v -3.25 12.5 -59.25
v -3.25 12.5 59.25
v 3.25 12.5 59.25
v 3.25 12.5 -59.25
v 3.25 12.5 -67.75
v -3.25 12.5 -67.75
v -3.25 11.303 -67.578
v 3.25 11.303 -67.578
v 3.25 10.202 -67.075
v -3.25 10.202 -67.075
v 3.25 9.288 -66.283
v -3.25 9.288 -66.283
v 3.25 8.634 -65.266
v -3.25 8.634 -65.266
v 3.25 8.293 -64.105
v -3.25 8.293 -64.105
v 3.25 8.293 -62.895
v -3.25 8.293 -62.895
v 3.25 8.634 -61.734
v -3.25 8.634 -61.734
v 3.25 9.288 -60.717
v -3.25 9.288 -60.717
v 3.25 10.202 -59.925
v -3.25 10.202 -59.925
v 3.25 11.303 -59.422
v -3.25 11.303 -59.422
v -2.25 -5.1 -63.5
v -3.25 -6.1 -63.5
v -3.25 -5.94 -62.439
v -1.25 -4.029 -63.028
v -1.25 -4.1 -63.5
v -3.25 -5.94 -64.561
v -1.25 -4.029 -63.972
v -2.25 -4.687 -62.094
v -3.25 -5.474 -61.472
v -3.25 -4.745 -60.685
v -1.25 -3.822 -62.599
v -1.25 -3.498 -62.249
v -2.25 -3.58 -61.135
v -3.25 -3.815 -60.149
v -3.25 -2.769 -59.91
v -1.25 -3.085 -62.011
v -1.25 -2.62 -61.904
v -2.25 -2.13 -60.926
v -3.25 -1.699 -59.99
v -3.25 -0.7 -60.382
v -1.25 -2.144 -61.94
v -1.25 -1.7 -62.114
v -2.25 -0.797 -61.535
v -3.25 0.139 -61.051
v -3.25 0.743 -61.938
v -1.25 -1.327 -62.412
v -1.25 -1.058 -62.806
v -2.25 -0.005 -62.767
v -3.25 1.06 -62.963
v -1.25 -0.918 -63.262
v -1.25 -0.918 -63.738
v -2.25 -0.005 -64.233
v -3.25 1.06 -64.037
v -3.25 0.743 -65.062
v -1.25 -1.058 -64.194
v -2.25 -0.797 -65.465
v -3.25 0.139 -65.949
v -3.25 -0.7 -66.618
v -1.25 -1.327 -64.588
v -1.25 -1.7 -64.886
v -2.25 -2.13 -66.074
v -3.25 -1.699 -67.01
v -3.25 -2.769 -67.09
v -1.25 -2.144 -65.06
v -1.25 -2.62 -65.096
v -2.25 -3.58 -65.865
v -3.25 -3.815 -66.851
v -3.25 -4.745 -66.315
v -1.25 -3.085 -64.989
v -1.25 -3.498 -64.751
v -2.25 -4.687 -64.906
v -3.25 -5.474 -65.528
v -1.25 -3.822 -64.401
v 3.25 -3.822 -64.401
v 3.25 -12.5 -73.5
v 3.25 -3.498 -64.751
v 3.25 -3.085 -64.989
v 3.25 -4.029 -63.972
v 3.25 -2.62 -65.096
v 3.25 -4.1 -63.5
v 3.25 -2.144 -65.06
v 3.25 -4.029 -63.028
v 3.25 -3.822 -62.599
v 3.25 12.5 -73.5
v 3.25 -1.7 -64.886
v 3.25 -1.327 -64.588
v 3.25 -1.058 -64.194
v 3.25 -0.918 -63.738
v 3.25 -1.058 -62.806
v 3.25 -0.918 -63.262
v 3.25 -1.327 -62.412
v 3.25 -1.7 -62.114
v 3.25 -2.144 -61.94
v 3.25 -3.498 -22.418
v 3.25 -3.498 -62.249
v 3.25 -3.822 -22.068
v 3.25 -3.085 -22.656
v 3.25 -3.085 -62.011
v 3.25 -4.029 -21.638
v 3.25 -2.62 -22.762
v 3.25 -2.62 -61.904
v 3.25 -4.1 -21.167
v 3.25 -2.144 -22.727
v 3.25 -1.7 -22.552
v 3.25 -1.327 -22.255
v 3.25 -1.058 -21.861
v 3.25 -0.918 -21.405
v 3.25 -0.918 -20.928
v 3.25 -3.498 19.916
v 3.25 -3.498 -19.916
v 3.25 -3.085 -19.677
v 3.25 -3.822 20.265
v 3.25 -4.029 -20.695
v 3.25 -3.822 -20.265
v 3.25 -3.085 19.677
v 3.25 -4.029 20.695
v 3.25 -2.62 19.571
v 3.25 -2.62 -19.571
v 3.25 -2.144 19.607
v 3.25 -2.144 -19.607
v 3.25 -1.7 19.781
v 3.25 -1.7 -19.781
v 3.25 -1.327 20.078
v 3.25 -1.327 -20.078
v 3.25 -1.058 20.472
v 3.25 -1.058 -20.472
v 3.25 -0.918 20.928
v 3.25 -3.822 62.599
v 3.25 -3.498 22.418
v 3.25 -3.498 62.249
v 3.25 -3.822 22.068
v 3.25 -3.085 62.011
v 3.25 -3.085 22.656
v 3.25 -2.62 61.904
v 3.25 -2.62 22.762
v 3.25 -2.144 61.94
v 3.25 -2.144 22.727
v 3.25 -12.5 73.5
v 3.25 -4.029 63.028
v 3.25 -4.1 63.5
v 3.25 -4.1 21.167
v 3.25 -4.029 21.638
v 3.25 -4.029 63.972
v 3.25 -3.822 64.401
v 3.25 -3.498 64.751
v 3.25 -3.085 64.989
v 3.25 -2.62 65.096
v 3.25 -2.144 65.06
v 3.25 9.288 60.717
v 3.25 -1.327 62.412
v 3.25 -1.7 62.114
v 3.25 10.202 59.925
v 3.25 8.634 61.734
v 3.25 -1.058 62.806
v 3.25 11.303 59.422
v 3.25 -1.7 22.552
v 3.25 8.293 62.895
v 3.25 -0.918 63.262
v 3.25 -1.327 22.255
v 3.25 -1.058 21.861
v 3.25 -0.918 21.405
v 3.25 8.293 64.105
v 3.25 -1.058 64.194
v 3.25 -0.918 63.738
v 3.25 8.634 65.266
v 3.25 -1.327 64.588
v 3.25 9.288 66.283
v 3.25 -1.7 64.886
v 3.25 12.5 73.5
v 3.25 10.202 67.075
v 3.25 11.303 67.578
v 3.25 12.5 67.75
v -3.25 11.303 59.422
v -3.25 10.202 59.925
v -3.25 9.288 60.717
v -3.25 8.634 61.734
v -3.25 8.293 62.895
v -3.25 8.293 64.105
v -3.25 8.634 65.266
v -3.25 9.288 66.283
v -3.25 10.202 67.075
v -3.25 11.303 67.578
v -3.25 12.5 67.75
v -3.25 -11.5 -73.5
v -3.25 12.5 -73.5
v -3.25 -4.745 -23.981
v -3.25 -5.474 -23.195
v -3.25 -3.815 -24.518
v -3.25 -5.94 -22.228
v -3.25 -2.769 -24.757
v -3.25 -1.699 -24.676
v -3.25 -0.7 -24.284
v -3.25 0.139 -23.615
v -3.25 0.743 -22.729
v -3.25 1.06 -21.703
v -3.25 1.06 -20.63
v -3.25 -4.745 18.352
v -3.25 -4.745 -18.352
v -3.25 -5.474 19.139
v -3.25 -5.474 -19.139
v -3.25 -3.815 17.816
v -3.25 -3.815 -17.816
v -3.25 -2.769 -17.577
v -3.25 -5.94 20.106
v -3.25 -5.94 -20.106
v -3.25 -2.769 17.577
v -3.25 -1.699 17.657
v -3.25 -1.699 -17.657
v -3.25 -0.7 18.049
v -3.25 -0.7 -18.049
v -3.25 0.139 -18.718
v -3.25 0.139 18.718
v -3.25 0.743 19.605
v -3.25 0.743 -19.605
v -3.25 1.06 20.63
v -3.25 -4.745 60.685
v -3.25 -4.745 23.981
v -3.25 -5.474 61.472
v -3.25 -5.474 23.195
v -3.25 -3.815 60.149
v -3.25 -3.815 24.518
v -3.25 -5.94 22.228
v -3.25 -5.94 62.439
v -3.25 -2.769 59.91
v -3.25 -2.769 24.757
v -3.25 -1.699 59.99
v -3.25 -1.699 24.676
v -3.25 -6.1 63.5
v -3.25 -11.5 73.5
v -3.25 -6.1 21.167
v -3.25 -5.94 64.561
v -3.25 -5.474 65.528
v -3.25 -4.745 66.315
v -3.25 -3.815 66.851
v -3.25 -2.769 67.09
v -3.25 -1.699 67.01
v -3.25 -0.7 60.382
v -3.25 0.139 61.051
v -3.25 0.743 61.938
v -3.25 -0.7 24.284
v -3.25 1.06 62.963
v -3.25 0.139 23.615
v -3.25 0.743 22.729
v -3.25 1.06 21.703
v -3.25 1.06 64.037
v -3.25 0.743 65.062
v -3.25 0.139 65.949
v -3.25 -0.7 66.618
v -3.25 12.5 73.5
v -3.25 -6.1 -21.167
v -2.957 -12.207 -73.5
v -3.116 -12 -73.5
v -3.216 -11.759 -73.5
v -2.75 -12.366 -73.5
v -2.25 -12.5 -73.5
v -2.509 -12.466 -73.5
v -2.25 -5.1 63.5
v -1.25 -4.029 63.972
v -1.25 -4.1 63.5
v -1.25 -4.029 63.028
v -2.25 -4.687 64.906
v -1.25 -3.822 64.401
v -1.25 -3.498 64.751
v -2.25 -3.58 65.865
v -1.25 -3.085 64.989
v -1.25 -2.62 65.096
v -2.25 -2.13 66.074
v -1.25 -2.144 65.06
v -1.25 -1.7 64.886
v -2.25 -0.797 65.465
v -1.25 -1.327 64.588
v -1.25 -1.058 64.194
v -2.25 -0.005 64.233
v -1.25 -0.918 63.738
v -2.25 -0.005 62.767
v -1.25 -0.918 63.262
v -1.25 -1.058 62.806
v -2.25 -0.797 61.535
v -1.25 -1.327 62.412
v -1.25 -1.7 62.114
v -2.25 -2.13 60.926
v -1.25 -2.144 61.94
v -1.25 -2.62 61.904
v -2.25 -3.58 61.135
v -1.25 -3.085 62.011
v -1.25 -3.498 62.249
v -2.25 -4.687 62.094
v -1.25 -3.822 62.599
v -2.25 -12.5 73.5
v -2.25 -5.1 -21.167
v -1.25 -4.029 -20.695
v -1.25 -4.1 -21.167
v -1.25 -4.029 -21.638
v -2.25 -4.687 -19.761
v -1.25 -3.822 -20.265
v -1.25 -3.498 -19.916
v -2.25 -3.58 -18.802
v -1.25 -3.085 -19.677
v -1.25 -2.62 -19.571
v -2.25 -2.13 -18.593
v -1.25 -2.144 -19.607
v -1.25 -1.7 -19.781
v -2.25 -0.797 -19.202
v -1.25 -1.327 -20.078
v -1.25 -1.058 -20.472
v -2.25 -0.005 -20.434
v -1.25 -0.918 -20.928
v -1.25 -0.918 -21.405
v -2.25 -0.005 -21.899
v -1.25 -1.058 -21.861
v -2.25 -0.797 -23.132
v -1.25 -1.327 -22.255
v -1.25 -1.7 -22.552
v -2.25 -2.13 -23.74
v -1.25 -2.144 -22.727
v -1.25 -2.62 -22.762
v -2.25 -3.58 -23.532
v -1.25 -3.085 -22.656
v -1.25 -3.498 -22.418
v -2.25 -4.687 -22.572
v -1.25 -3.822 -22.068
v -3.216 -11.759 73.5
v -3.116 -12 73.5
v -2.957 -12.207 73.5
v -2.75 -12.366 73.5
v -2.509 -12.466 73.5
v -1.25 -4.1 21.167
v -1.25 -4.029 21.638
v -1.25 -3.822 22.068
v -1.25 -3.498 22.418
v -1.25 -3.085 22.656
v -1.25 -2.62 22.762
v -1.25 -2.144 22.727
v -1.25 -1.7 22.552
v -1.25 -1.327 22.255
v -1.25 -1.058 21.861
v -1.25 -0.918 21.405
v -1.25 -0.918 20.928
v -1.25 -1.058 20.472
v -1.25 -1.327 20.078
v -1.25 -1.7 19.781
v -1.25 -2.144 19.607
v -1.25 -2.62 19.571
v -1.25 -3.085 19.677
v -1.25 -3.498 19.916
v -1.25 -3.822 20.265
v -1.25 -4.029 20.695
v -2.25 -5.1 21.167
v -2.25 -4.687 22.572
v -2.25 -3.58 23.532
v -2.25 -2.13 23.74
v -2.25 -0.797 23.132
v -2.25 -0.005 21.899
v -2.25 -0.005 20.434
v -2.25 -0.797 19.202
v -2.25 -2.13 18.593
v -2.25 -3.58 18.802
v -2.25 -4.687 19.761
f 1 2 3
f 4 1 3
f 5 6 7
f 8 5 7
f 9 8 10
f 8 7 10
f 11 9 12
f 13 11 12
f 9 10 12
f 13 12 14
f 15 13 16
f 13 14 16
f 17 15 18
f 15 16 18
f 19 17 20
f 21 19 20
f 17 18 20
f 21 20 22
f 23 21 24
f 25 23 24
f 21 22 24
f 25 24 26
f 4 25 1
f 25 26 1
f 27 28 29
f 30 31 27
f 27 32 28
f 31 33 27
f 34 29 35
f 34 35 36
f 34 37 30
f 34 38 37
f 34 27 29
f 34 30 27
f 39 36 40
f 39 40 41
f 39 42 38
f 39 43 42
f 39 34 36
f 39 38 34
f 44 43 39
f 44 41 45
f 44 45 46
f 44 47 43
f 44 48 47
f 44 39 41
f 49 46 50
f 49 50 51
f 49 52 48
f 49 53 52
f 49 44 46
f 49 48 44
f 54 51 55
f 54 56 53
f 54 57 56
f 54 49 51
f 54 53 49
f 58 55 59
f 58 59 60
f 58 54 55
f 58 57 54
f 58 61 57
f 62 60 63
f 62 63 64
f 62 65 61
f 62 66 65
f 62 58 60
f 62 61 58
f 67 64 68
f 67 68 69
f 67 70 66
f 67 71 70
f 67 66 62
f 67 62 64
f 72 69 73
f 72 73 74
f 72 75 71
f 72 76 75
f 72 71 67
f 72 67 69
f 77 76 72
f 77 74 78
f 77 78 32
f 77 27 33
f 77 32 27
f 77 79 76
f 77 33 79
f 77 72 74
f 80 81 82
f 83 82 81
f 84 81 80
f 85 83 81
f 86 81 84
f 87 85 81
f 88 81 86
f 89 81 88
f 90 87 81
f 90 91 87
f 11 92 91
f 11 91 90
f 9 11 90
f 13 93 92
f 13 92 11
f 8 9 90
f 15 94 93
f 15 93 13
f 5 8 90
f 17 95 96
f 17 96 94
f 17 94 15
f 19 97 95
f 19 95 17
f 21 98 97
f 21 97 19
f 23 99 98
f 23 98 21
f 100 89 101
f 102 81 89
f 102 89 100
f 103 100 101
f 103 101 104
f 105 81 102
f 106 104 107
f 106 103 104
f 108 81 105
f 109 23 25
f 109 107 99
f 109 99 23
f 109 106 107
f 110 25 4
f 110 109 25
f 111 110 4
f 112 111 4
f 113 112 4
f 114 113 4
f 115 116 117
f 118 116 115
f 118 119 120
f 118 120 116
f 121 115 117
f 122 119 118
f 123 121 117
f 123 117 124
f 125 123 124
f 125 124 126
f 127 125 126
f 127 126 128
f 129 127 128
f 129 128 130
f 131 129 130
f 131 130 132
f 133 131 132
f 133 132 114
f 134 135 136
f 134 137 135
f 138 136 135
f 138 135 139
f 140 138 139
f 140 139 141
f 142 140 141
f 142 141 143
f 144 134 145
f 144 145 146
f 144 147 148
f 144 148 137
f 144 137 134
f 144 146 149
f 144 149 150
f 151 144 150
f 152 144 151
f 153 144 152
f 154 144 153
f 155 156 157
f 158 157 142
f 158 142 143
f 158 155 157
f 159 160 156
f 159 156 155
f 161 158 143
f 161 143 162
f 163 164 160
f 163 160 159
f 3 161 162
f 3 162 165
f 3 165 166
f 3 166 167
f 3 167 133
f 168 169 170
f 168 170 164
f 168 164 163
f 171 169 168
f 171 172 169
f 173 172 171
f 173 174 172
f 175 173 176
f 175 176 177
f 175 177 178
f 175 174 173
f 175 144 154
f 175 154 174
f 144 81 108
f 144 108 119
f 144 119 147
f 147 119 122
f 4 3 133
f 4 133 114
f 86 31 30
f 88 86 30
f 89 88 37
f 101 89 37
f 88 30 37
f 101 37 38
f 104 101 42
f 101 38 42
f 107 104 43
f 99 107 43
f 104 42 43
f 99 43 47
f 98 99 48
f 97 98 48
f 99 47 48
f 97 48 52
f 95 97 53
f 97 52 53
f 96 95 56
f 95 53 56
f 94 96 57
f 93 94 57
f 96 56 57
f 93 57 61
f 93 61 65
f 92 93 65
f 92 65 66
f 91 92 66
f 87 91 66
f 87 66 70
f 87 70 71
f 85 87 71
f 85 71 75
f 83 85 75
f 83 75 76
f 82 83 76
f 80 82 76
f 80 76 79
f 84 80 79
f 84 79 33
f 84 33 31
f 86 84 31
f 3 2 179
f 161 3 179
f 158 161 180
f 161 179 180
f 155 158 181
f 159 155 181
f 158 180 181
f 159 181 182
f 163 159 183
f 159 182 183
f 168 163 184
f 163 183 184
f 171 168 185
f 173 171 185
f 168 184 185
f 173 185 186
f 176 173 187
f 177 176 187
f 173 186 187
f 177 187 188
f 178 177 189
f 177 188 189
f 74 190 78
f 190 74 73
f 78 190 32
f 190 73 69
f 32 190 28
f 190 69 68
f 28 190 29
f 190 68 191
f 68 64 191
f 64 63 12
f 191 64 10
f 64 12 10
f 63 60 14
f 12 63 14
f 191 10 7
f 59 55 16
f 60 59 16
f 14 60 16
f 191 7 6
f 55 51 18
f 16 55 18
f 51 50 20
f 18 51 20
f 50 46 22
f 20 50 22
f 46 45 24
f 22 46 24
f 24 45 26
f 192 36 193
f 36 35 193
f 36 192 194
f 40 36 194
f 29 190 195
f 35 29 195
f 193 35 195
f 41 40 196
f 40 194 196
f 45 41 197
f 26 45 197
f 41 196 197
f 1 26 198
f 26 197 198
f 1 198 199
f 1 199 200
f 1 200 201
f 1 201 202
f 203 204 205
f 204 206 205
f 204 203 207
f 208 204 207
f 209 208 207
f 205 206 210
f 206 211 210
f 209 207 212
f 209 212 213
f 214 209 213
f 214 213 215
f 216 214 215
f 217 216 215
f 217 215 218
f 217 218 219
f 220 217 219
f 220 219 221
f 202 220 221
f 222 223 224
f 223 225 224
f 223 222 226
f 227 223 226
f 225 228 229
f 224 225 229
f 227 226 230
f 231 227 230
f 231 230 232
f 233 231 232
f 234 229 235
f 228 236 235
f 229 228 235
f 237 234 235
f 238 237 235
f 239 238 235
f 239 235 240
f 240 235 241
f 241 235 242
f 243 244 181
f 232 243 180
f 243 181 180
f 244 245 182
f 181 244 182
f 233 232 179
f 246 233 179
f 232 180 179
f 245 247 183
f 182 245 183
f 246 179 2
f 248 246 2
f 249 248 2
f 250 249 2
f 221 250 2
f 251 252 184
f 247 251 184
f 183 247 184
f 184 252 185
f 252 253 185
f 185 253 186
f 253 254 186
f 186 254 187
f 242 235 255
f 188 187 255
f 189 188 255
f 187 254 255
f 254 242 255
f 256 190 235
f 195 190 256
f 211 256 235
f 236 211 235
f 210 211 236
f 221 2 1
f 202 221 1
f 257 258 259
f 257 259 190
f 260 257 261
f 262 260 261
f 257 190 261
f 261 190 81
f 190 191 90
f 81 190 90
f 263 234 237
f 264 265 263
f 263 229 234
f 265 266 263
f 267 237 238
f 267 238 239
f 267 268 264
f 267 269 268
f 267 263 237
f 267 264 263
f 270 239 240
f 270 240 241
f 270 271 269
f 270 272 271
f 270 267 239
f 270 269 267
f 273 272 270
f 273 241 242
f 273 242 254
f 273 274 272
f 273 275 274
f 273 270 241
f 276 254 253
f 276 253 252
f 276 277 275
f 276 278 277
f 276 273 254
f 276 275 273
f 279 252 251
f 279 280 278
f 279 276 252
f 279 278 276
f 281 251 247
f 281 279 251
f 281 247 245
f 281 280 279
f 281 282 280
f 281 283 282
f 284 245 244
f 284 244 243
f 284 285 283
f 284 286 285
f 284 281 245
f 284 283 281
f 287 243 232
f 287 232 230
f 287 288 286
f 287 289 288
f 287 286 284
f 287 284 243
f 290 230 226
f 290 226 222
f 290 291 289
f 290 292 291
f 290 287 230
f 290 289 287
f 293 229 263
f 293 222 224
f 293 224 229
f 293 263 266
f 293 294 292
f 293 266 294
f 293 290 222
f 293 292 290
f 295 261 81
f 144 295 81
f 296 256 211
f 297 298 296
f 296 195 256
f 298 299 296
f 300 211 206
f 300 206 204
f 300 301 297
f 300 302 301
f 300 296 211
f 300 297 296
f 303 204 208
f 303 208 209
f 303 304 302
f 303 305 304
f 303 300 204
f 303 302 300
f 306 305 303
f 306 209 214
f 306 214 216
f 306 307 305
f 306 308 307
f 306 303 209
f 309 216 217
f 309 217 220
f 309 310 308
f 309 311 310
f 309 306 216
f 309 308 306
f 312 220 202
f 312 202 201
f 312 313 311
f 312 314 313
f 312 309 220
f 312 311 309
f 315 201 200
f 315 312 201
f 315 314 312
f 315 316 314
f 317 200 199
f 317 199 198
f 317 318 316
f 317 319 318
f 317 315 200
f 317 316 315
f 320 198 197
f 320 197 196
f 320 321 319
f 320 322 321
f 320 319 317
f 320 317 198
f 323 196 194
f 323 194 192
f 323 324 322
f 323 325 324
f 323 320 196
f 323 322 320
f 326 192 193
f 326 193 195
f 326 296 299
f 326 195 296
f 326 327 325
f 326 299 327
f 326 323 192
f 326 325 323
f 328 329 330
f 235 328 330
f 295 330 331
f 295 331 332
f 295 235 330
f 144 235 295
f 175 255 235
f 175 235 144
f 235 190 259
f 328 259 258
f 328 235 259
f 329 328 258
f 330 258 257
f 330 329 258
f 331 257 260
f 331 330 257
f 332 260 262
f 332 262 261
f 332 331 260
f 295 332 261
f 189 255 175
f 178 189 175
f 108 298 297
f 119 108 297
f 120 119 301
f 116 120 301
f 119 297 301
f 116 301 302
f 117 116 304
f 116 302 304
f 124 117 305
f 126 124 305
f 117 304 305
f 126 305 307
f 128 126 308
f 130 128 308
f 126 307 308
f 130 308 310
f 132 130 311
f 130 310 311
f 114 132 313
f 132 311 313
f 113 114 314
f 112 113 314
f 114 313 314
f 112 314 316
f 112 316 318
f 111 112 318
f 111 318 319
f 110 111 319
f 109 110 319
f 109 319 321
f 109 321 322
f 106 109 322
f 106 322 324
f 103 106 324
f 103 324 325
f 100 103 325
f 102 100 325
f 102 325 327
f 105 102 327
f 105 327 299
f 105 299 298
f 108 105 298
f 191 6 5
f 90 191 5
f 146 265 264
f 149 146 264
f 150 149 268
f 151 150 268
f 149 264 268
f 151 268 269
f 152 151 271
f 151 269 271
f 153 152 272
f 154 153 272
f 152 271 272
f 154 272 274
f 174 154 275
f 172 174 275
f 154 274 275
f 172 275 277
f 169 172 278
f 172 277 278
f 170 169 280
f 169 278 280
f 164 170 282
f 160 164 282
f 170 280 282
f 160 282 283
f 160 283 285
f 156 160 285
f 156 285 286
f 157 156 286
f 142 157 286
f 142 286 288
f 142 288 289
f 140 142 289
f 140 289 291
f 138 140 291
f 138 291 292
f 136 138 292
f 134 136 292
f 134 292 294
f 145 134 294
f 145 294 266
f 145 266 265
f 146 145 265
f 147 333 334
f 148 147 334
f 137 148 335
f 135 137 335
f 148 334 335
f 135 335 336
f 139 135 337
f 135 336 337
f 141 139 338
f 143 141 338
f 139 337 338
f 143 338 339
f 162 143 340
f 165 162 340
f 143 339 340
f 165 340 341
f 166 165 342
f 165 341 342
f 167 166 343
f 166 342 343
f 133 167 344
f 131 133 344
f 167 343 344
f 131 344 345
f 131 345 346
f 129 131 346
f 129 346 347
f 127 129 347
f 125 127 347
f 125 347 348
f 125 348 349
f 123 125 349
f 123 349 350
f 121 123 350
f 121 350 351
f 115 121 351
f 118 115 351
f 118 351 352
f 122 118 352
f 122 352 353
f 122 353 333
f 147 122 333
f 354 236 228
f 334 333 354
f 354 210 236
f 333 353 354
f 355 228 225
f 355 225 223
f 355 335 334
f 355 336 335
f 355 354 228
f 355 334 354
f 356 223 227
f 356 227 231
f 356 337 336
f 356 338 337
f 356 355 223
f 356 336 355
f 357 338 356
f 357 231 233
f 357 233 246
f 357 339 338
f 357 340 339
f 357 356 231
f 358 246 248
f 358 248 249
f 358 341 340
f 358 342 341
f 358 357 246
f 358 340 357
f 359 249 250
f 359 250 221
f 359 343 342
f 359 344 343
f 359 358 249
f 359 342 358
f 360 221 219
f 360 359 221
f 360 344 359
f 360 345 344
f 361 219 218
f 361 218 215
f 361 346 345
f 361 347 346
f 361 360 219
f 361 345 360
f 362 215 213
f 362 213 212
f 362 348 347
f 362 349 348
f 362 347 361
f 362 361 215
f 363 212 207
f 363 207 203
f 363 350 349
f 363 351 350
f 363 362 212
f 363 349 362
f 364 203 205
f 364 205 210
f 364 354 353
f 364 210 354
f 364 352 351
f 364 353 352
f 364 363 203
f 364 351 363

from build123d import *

# Parameters (mm, degrees)
SKETCH_2_W          = 6.5
SKETCH_2_H          = 25
EXTRUDE_1_DEPTH     = 73.5
FILLET_1_R          = 1
SKETCH_3_R          = 1.6
CUT_EXTRUDE_1_DEPTH = 75.838158716
CHAMFER_2_SIZE      = 2
SKETCH_4_R          = 4.25
CUT_EXTRUDE_2_DEPTH = 75.838158716


with BuildPart() as part:
    # 草图2 → 凸台-拉伸1 (new, symmetric)
    with BuildSketch(Plane.XY):
        Rectangle(SKETCH_2_W, SKETCH_2_H)
    extrude(amount=EXTRUDE_1_DEPTH, both=True)

    # 圆角1
    fillet_1_edges = [part.edges().sort_by_distance(p)[0] for p in [
        (-3.25, -12.5, 0),
    ]]
    fillet(fillet_1_edges, radius=FILLET_1_R)

    # 草图3 → 切除-拉伸1 (cut, through all)
    with BuildSketch(Plane.ZY.offset(3.25)):
        with Locations(Location((63.5, -2.5, 0), (0, 0, 270))):
            Circle(SKETCH_3_R)
        with Locations(Location((21.166666667, -2.5, 0), (0, 0, 270))):
            Circle(SKETCH_3_R)
        with Locations(Location((-21.166666667, -2.5, 0), (0, 0, 270))):
            Circle(SKETCH_3_R)
        with Locations(Location((-63.5, -2.5, 0), (0, 0, 270))):
            Circle(SKETCH_3_R)
    extrude(amount=-CUT_EXTRUDE_1_DEPTH, mode=Mode.SUBTRACT)

    # 倒角2
    chamfer_2_edges = [part.edges().sort_by_distance(p)[0] for p in [
        (-3.25, -0.9, 63.5),
        (-3.25, -0.9, 21.166666667),
        (-3.25, -0.9, -21.166666667),
        (-3.25, -0.9, -63.5),
    ]]
    chamfer(chamfer_2_edges, length=CHAMFER_2_SIZE)

    # 草图4 → 切除-拉伸2 (cut, through all)
    with BuildSketch(Plane.ZY.offset(3.25)):
        with Locations((-63.5, 12.5)):
            Circle(SKETCH_4_R)
        with Locations((63.5, 12.5)):
            Circle(SKETCH_4_R)
    extrude(amount=-CUT_EXTRUDE_2_DEPTH, mode=Mode.SUBTRACT)


solid = part.part
